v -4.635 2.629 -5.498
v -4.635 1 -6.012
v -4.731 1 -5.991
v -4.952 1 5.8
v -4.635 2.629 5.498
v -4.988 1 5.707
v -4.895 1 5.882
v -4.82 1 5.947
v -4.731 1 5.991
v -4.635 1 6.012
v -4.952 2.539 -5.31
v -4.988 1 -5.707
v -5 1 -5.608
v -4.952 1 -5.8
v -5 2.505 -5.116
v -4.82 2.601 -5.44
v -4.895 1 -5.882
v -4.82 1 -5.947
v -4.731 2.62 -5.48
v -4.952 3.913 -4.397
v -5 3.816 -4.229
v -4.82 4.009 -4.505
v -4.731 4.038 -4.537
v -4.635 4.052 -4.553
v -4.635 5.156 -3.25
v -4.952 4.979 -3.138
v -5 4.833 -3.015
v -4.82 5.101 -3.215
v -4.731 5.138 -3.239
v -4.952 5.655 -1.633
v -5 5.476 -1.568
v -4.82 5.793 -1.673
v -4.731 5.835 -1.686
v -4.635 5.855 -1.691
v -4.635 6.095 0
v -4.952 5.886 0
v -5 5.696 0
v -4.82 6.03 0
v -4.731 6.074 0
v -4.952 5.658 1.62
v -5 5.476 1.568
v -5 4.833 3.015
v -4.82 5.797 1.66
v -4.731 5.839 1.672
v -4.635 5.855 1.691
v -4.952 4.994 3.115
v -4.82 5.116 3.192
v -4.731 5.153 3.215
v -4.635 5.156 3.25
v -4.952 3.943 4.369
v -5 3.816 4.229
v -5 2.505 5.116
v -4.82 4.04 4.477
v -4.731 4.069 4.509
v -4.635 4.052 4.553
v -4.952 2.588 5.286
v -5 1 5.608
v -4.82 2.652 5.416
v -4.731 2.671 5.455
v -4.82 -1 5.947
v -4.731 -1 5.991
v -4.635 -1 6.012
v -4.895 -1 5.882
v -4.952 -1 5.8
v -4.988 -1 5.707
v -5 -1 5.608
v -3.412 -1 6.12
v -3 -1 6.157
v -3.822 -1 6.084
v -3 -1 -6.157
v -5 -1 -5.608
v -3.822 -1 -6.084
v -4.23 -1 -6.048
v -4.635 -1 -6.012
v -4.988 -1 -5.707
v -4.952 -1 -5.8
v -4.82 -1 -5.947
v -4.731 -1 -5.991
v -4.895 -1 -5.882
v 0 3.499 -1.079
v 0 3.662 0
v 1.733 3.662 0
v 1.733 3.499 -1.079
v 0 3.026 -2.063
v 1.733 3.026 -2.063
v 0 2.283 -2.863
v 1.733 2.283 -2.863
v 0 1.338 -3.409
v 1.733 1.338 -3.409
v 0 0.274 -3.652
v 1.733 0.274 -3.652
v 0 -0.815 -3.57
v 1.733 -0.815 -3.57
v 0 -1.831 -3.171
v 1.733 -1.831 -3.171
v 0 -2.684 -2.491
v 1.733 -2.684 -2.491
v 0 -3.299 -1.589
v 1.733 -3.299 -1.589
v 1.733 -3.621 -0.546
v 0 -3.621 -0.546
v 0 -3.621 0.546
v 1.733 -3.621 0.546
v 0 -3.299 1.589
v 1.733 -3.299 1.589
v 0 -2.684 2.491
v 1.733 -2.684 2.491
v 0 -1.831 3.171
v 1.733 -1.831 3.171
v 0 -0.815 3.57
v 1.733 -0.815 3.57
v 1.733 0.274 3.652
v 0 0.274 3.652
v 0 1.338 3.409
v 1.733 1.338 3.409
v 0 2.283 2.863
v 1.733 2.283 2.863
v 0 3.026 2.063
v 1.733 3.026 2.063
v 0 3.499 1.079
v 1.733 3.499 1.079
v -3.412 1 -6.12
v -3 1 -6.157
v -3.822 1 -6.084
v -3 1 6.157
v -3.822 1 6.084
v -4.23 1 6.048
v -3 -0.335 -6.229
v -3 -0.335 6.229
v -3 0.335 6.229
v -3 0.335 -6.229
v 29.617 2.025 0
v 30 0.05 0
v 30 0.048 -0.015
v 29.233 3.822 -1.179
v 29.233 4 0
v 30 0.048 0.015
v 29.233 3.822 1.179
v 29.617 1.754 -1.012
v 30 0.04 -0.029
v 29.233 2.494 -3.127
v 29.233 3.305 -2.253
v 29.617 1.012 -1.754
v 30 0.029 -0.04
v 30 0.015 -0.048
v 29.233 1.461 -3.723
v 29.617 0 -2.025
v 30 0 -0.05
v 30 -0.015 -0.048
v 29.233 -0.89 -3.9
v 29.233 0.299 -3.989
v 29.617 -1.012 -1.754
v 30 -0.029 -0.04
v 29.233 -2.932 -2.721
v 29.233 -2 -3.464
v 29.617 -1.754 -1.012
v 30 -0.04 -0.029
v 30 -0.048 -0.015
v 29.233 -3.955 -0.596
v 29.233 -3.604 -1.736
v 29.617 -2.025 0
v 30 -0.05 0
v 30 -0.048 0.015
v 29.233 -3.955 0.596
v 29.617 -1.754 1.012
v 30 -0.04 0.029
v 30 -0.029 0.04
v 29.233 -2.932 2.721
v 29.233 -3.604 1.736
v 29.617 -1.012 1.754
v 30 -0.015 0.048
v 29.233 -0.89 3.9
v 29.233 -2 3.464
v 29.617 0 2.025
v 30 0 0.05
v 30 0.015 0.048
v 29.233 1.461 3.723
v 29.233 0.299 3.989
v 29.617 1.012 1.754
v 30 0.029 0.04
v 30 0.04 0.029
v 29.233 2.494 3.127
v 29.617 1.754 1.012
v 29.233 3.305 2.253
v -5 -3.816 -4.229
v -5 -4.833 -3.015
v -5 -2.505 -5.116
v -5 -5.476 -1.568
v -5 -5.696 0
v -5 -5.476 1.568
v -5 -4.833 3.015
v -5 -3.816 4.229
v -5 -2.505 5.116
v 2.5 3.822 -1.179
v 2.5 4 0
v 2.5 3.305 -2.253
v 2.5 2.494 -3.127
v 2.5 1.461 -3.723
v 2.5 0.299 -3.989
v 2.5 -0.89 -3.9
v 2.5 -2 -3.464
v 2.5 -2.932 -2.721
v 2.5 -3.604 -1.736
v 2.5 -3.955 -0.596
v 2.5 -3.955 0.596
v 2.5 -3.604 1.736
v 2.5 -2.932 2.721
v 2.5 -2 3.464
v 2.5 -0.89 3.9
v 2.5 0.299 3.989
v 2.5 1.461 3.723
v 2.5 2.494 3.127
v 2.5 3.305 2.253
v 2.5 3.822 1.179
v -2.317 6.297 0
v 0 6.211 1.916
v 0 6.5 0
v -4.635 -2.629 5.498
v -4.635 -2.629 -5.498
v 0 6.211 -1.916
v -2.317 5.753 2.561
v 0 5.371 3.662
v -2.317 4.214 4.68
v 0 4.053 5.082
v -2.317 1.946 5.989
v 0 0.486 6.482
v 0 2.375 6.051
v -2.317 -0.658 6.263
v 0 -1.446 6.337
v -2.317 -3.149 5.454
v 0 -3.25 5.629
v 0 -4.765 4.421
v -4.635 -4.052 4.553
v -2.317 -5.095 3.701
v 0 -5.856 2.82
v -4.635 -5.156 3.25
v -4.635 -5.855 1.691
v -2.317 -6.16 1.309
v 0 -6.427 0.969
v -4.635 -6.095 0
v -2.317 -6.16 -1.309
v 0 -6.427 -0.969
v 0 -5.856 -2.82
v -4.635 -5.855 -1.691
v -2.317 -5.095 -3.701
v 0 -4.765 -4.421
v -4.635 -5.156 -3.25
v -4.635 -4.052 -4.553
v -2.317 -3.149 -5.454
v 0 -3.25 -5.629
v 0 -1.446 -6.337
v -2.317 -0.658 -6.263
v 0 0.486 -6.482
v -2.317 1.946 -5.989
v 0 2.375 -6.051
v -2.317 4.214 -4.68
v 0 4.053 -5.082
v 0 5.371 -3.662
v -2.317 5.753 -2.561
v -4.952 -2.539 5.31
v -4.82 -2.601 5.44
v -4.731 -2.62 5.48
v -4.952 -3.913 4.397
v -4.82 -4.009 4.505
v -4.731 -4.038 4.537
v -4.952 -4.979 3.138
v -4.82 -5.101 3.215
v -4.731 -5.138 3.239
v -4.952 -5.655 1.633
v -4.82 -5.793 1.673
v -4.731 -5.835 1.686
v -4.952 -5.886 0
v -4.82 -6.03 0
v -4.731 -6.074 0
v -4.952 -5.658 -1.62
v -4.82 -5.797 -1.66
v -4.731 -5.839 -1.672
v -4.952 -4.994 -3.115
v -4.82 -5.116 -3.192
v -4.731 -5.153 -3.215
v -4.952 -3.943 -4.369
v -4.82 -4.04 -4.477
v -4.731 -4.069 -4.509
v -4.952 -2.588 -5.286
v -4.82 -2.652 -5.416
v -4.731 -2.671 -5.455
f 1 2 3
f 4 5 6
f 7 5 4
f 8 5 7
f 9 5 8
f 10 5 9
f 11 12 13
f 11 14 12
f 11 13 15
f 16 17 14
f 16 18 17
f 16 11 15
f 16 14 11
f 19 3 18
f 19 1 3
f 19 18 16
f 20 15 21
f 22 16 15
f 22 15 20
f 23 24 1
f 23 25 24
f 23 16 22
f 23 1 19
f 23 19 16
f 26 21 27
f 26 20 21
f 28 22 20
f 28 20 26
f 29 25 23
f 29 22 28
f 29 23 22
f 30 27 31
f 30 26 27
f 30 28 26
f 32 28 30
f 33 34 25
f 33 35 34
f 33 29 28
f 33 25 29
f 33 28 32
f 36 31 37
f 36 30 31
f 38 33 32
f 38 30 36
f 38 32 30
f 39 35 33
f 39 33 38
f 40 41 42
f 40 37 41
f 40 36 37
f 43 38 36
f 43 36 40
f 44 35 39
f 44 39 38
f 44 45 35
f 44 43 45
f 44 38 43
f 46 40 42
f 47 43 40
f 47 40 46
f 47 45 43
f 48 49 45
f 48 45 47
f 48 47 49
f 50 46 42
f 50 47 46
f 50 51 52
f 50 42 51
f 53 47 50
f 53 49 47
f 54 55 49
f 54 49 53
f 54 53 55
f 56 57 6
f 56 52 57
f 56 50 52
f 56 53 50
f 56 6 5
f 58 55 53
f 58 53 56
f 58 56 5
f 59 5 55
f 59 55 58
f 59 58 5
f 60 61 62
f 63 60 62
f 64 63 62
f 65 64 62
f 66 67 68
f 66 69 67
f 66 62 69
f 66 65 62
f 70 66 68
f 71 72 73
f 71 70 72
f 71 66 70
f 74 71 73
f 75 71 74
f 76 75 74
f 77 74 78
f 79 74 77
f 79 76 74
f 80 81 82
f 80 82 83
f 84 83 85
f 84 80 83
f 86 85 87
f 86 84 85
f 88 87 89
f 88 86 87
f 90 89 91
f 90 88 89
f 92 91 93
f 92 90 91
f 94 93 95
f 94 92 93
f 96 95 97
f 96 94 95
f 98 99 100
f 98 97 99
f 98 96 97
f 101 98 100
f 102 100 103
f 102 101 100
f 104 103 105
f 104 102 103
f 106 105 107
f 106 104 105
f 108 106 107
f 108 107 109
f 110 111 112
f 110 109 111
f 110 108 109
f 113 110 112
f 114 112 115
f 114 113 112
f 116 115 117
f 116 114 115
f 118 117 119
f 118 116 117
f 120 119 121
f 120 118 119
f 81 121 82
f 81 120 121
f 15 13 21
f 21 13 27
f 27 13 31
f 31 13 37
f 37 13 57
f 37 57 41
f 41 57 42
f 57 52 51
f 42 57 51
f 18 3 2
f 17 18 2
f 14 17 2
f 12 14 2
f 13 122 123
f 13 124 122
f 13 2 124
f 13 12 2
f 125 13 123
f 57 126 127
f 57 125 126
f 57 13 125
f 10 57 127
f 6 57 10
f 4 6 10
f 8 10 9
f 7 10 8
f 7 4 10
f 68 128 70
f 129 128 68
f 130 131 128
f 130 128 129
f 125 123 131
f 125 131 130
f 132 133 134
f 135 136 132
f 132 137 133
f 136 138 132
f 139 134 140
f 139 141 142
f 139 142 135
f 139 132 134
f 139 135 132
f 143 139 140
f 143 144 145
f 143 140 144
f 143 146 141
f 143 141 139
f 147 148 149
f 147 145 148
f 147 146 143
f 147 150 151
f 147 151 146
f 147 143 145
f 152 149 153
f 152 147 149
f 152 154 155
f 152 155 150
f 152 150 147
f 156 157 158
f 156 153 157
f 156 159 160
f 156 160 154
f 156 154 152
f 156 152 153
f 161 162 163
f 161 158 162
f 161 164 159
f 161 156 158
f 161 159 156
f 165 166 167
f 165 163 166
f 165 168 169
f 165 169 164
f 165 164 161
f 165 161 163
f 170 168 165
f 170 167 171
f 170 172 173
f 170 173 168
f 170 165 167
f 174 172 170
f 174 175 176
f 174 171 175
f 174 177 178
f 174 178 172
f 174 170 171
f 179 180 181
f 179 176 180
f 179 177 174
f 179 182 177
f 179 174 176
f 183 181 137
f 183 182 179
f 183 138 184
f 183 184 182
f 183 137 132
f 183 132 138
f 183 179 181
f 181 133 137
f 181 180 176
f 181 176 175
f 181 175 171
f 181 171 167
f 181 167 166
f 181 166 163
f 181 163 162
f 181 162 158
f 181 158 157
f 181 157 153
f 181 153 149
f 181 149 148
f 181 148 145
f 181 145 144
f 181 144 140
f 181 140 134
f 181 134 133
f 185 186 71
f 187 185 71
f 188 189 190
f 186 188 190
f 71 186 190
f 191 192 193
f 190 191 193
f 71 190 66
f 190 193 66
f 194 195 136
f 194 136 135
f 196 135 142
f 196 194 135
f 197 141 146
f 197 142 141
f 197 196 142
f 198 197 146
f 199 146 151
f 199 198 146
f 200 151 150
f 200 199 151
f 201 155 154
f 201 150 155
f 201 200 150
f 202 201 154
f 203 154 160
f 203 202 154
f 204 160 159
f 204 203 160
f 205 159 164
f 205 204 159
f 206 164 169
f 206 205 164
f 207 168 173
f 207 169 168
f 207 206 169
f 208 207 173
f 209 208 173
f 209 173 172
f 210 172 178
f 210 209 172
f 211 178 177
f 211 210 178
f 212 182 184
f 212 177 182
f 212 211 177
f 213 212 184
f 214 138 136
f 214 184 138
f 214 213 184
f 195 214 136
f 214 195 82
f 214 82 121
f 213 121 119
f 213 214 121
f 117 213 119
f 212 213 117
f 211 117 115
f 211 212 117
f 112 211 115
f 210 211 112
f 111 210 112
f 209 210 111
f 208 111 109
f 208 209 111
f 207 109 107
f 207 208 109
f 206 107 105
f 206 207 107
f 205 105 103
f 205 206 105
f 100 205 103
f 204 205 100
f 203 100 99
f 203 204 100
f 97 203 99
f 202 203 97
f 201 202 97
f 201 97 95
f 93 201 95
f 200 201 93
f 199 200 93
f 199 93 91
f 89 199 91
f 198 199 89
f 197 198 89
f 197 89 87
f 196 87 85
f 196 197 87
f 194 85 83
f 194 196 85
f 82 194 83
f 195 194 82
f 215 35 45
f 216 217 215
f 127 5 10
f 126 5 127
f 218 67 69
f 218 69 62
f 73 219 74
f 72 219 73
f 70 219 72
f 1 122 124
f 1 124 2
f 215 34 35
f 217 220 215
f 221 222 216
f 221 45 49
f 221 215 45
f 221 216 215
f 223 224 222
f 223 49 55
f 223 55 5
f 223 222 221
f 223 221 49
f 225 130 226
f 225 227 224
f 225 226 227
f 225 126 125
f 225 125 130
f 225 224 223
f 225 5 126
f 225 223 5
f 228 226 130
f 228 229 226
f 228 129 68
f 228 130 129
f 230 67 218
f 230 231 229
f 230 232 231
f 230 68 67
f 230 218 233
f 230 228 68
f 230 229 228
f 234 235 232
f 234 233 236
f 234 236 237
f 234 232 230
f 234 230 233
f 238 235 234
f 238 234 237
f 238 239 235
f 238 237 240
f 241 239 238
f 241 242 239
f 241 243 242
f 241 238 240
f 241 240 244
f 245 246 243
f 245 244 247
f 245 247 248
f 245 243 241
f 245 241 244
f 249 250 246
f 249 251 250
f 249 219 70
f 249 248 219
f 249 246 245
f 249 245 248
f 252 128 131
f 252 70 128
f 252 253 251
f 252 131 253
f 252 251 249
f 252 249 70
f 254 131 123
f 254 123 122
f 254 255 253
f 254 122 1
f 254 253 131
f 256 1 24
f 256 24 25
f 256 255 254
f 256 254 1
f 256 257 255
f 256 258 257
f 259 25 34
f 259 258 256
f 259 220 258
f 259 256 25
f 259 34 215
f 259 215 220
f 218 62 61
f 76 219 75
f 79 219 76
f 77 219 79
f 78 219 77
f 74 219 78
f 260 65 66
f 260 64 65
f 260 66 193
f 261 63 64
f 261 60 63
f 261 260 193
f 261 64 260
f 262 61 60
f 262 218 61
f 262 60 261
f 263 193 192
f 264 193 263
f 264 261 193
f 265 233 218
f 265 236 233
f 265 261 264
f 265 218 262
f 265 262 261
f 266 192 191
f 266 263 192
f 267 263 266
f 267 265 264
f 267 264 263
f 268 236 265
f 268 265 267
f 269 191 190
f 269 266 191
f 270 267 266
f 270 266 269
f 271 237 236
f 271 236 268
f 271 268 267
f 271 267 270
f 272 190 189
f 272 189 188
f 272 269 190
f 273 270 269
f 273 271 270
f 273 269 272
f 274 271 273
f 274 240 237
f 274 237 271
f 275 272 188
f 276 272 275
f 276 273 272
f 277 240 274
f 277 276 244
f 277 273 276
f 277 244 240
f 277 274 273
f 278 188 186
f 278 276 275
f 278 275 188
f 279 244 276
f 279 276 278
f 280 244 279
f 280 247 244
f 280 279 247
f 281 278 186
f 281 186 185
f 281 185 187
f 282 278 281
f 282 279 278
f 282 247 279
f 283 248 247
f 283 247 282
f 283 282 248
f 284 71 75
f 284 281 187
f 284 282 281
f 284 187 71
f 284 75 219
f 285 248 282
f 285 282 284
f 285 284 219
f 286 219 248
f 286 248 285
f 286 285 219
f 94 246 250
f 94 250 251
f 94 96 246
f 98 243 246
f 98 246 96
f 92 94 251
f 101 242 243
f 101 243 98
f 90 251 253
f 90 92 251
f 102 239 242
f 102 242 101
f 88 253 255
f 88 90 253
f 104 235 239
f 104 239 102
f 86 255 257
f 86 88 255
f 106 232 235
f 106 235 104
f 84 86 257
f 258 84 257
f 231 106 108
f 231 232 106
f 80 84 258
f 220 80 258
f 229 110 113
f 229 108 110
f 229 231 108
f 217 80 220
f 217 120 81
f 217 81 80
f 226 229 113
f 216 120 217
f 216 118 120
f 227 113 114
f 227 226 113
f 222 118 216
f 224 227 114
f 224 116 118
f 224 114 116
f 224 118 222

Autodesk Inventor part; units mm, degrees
ref_plane "YZ Plane" through (0, 0, 0) normal (1, 0, 0) x (0, 1, 0)
ref_plane "XZ Plane" through (0, 0, 0) normal (0, 1, 0) x (-1, 0, 0)
sketch "Schizzo1" plane through (0, 0, 0) normal (0, 0, 1) x (1, 0, 0)
  line L0 (-5, 0) -> (30, 0)
  line L1 (30, 0) -> (30, 4)
  line L2 (30, 4) -> (2.5, 4)
  line L3 (2.5, 4) -> (1.7331, 3.6618)
  line L4 (1.7331, 3.6618) -> (0, 3.6618)
  line L5 (0, 3.6618) -> (0, 6.5)
  line L6 (-12, 0) -> (37, 0) projected
  line L7 (0, -1.3) -> (0, 7.8) projected
  line L8 (-5, 0) -> (-5, 6.0626)
  line L9 (0, 6.5) -> (-5, 6.0626)
  line L10 (2.5, 4) -> (0, 4) construction
  dimension "d0" = 30
  dimension "d1" = 27.5
  dimension "d2" = 0.7669
  dimension "d3" = 5
  dimension "d4" = 8
  dimension "d5" = 7.3235
  dimension "d9" = 13
  dimension "d10" = 5
revolve "Corpo" add sketch "Schizzo1" angle 360 about axis through (-5, 0, 0) along (1, 0, 0)
sketch "Schizzo2" plane through (-5, 0, 0) normal (-1, 0, 0) x (0, 0, 1)
  circle A0 centre (0, 0) radius 6.5 projected
  line L0 (0, 0) -> (0, 6.0626) projected
  line L1 (-6.5, 1) -> (6.5, 1)
  line L2 (6.5, 1) -> (6.5, -1)
  line L3 (6.5, -1) -> (-6.5, -1)
  line L4 (-6.5, -1) -> (-6.5, 1)
  line L5 (-6.5, 0) -> (6.5, 0) construction
  line L6 (0, 1) -> (0, -1) construction
  dimension "d11" = 2
  dimension "d12" = 13
fillet "Raccordo1" radius 0.4 1 edges at (-5, -6.0626, 0)
extrude "Intaglio" cut sketch "Schizzo2" against normal blind 2 contours A0 L3 L1 | L2 L3 A0 | A0 L1 L2 | A0 L4 L1 | L3 L4 A0
thread "Filettatura" size "M8x1.25" class "6g" standard "ISO Metric profile" length 27.5
chamfer "Smusso1" distance 3.95 distance2 0.7669 1 edges at (30, -4, 0) measured on face at (30, 0.998, 0.8842)
ref_plane "Work Plane1" through (30.1625, 0, 0) normal (0, 0, -1) x (1, 0, 0)
equation "\"d11\" = SBR"
equation "\"d12\" = KOD"
equation "\"d14\" = RR"
equation "\"d19\" = STI"
equation "\"d15\" = GEL"
equation "\"d17\" = -0.5 * SPD + 0.5 * GD"
equation "\"d0\" = NLG"
equation "\"d1\" = GEL"
equation "\"d3\" = KOH"
equation "\"d4\" = GD"
equation "\"d5\" = BDM"
equation "\"d9\" = KOD"
equation "\"d10\" = KEWI"
equation "\"GD\" = NND"
equation "\"NLG\" = 30"
equation "\"GEL\" = 27.5"
equation "\"KOD\" = 13"
equation "\"KOH\" = 5"
equation "\"GAL\" = 0.61345 * PTC"
equation "\"SPD\" = 0.1"
equation "\"BDM\" = 7.3235"
equation "\"GUL\" = 0.61345 * PTC"
equation "\"RR\" = 0.4"
equation "\"SBR\" = 2"
equation "\"STI\" = 2"
equation "\"KEWI\" = 5deg"
equation "\"THREADDIA\" = 8"
equation "\"TOA\" = 30deg"
equation "\"PTC\" = 1.25"
equation "\"NND\" = 8"
equation "\"GD1\" = THREADDIA - 1.2269 * PTC"
properties part number "IS 1366 - M8 x 30" material "Acciaio, Dolce"
